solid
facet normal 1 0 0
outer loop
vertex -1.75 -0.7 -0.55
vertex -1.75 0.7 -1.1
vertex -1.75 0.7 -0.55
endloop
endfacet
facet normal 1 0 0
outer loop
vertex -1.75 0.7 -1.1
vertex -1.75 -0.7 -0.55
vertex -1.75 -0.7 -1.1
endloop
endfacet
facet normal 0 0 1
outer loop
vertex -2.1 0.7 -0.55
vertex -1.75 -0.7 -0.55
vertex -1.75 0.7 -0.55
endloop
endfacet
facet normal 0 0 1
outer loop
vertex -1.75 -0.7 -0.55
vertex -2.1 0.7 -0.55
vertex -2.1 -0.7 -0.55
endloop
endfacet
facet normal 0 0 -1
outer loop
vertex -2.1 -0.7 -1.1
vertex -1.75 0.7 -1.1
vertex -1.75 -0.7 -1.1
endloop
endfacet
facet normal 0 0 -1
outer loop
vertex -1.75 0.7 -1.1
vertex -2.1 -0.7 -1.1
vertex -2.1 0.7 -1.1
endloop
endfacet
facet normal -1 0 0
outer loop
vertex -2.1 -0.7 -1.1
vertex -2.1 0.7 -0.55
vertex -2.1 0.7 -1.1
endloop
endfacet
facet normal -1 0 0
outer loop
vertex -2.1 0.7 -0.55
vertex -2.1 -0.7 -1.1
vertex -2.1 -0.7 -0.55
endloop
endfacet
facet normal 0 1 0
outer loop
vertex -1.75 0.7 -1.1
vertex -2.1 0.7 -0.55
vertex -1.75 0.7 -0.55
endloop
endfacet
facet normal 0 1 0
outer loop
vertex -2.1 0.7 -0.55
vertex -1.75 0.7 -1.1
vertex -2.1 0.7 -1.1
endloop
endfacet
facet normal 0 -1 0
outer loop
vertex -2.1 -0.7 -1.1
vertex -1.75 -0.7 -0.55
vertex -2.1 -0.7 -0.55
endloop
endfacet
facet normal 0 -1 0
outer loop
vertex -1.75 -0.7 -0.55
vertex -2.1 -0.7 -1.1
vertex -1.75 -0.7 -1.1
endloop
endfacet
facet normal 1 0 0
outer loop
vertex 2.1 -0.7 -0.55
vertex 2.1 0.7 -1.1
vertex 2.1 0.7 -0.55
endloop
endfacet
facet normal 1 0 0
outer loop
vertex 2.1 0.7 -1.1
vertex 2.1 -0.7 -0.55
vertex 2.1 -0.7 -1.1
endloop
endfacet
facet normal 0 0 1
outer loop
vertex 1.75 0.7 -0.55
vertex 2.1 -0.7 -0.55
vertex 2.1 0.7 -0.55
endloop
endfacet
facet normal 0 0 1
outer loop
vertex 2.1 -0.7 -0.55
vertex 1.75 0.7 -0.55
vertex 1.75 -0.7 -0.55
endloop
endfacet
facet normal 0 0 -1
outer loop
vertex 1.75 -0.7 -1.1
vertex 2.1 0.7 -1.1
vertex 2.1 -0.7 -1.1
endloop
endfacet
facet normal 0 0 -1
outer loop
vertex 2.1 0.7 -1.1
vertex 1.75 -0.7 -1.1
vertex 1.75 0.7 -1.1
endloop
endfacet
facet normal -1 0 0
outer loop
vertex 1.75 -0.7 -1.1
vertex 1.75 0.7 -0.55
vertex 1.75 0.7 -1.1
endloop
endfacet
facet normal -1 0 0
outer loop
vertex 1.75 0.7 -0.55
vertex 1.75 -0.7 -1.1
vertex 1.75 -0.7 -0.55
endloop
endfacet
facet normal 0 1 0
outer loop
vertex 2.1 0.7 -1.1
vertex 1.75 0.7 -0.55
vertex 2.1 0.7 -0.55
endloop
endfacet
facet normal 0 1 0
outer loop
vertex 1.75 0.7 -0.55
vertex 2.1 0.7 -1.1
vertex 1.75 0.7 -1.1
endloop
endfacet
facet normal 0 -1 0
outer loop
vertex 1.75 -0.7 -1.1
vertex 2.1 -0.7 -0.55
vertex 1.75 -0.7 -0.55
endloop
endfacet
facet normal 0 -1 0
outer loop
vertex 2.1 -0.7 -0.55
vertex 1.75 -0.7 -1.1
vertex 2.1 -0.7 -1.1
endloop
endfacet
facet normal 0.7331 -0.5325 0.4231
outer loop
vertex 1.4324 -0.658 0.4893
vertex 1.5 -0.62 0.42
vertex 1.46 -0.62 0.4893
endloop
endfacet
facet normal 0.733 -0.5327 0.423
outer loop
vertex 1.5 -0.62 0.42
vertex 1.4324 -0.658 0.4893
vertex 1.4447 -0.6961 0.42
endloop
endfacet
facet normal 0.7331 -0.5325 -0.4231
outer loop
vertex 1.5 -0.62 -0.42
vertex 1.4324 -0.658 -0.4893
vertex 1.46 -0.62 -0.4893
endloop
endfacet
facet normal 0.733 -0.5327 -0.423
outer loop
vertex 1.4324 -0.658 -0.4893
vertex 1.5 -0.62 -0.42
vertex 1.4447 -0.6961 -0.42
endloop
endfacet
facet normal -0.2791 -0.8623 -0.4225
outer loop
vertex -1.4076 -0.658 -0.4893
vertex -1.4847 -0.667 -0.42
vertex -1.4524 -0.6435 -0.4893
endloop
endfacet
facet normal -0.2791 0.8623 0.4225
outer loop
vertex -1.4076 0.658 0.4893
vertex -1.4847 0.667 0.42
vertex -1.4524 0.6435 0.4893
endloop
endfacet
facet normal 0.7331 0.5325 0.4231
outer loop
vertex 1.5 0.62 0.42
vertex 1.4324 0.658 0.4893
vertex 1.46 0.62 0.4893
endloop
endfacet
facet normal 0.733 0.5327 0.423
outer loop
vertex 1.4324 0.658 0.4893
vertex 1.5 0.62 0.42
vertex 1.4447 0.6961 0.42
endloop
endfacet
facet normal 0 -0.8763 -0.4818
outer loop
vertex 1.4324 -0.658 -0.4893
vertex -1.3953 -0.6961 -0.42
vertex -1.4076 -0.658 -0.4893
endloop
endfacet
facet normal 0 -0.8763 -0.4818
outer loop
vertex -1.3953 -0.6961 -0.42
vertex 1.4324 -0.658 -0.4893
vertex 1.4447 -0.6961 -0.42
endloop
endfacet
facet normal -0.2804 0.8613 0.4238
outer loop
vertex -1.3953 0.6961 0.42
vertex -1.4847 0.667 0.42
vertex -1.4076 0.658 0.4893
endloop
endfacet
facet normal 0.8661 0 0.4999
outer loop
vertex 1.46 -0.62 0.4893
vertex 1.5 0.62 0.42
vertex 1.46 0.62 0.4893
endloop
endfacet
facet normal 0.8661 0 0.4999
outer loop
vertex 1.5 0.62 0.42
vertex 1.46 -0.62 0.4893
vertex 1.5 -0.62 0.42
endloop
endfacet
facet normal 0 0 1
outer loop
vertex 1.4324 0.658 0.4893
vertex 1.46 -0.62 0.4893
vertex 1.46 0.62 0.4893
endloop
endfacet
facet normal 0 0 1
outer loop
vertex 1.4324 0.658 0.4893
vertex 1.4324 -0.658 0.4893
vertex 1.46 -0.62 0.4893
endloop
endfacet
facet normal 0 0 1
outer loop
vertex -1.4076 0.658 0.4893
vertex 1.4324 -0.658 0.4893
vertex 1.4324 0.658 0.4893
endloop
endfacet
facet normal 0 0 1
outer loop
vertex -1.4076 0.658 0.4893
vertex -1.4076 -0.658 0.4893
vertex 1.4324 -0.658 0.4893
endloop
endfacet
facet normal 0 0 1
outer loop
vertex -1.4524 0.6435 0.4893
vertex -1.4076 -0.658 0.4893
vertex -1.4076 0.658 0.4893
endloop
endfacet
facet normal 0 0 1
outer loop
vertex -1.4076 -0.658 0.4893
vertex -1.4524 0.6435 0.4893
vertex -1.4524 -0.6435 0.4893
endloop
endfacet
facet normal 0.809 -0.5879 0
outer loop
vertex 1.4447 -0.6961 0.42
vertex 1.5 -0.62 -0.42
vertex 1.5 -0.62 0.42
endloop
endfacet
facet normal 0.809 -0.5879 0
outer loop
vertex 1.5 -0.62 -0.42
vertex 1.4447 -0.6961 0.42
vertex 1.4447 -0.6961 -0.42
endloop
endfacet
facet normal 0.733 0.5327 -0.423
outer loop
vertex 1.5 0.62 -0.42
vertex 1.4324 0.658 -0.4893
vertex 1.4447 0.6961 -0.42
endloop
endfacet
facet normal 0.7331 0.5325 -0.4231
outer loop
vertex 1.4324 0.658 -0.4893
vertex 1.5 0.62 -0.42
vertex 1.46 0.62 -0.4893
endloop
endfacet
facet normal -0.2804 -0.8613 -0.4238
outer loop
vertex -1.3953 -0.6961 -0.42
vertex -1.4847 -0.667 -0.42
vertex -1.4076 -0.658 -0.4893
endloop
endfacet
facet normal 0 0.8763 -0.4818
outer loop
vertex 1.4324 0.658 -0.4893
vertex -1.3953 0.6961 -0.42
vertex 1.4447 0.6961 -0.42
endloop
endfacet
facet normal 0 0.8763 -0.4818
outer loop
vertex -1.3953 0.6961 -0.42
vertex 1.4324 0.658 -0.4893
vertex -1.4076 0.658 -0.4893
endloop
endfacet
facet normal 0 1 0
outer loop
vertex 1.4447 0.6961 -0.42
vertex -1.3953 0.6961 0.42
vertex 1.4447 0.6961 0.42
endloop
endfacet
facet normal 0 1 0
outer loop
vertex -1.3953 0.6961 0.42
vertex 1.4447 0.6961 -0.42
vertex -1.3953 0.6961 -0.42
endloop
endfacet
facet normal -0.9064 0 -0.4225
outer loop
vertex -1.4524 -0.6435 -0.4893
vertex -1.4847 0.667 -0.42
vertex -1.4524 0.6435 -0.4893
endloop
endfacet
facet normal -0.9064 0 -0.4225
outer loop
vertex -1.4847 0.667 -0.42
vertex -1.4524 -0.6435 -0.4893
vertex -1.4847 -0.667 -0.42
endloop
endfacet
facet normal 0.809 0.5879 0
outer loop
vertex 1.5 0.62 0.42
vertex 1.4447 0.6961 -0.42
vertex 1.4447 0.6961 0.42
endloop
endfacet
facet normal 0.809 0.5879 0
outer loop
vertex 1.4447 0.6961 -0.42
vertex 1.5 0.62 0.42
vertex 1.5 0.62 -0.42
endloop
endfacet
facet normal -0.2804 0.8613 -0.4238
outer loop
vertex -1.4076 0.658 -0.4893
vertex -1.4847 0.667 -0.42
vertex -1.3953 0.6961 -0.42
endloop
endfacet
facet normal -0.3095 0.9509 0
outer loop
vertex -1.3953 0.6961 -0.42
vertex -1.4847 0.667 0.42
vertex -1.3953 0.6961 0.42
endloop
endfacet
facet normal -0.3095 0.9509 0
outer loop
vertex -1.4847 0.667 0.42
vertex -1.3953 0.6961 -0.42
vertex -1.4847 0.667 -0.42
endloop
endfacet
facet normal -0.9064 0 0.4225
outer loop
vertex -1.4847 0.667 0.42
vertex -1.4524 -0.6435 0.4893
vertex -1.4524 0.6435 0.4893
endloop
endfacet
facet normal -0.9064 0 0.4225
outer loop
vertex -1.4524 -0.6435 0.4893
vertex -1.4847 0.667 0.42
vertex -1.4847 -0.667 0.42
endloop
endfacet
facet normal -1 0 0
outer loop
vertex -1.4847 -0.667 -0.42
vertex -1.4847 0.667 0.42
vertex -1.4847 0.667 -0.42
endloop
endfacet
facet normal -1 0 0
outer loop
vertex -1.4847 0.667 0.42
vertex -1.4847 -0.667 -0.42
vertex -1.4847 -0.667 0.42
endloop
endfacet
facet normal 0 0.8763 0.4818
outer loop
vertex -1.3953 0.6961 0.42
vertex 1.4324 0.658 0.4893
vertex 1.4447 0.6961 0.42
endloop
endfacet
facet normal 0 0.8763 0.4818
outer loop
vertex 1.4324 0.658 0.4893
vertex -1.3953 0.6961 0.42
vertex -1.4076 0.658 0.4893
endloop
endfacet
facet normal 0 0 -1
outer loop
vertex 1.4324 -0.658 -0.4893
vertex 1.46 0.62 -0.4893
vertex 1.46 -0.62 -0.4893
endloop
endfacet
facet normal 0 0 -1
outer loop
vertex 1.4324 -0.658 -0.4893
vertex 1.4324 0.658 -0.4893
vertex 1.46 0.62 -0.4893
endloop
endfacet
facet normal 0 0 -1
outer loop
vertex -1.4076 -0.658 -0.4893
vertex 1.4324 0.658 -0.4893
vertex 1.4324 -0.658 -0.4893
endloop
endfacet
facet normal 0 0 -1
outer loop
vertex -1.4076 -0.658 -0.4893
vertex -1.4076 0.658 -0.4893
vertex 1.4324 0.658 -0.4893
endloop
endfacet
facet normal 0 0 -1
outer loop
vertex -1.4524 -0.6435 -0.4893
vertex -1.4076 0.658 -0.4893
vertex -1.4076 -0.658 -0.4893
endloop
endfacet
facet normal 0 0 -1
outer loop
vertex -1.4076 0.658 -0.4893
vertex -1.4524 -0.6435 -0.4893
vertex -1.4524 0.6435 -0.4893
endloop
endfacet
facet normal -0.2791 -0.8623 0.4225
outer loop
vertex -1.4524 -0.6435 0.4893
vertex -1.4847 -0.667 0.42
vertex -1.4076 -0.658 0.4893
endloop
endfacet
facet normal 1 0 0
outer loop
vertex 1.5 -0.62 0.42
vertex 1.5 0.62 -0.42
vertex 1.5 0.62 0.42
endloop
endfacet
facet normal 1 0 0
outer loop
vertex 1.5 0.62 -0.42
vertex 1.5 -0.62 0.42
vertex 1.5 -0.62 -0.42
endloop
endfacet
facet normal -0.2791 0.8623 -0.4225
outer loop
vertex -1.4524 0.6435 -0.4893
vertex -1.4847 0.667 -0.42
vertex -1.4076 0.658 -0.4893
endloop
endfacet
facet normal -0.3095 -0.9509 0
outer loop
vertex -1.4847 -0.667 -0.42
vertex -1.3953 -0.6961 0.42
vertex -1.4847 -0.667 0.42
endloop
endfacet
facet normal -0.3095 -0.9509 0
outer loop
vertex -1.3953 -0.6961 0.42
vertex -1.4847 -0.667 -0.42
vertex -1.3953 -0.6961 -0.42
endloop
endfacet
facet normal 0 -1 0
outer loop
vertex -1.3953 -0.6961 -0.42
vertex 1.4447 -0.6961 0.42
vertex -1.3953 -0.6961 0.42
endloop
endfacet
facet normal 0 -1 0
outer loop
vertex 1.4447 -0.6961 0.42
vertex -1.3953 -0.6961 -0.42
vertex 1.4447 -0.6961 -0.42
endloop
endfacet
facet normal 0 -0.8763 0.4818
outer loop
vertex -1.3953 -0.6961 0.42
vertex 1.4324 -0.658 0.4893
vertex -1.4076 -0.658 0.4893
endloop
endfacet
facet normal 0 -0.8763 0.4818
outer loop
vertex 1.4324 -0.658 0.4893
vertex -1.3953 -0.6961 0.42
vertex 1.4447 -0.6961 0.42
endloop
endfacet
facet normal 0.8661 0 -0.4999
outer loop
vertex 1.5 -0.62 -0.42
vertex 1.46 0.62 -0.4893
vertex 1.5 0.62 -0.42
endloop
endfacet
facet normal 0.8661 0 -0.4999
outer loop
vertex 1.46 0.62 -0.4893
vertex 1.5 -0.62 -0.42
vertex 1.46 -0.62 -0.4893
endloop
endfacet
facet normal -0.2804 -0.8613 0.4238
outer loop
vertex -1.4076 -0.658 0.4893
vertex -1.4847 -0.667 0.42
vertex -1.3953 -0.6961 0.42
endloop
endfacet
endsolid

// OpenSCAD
// Parameters
body_length = 3.0; //[1.5:6.0:0.1]
body_width = 1.4; //[0.7:2.8:0.1]
body_height = 1.0; //[0.5:2.0:0.1]
terminal_length = 0.35; //[0.2:0.8:0.05]
terminal_thickness = 0.12; //[0.05:0.3:0.01]
terminal_wrap_height = 0.55; //[0.3:1.0:0.05]
mark_length = 1.0; //[0.5:2.0:0.1]
mark_width = 0.5; //[0.2:1.2:0.05]
mark_thickness = 0.05; //[0.02:0.15:0.01]
fillet_radius = 0.08; //[0.03:0.2:0.01]
overlap = 0.6; //[0.3:1.5:0.1]

// Main body with rounded edges
module main_body() {
  minkowski() {
    translate([0, 0, 0])
      cube([body_length - 2*fillet_radius, body_width - 2*fillet_radius, body_height - 2*fillet_radius], center=true);
    sphere(r=fillet_radius);
  }
}

// Terminal on the left
module terminal_left() {
  translate([-(body_length/2 - terminal_length/2 + overlap), 0, -(body_height/2 - terminal_wrap_height/2 + overlap)])
    cube([terminal_length, body_width, terminal_wrap_height], center=true);
}

// Terminal on the right
module terminal_right() {
  translate([(body_length/2 - terminal_length/2 + overlap), 0, -(body_height/2 - terminal_wrap_height/2 + overlap)])
    cube([terminal_length, body_width, terminal_wrap_height], center=true);
}

// Top marking pad
module top_marking() {
  translate([0, 0, (body_height/2 - mark_thickness/2 - overlap)])
    cube([mark_length, mark_width, mark_thickness], center=true);
}

// Complete SMD component
module smd_component() {
  color([0.85, 0.85, 0.8]) // Off-white for the main body
  union() {
    main_body();
    color([0.2, 0.2, 0.2]) // Dark color for terminals
    union() {
      terminal_left();
      terminal_right();
    }
    color([0.1, 0.1, 0.6]) // Blue for the top marking
    top_marking();
  }
}

// Render the SMD component
smd_component();
